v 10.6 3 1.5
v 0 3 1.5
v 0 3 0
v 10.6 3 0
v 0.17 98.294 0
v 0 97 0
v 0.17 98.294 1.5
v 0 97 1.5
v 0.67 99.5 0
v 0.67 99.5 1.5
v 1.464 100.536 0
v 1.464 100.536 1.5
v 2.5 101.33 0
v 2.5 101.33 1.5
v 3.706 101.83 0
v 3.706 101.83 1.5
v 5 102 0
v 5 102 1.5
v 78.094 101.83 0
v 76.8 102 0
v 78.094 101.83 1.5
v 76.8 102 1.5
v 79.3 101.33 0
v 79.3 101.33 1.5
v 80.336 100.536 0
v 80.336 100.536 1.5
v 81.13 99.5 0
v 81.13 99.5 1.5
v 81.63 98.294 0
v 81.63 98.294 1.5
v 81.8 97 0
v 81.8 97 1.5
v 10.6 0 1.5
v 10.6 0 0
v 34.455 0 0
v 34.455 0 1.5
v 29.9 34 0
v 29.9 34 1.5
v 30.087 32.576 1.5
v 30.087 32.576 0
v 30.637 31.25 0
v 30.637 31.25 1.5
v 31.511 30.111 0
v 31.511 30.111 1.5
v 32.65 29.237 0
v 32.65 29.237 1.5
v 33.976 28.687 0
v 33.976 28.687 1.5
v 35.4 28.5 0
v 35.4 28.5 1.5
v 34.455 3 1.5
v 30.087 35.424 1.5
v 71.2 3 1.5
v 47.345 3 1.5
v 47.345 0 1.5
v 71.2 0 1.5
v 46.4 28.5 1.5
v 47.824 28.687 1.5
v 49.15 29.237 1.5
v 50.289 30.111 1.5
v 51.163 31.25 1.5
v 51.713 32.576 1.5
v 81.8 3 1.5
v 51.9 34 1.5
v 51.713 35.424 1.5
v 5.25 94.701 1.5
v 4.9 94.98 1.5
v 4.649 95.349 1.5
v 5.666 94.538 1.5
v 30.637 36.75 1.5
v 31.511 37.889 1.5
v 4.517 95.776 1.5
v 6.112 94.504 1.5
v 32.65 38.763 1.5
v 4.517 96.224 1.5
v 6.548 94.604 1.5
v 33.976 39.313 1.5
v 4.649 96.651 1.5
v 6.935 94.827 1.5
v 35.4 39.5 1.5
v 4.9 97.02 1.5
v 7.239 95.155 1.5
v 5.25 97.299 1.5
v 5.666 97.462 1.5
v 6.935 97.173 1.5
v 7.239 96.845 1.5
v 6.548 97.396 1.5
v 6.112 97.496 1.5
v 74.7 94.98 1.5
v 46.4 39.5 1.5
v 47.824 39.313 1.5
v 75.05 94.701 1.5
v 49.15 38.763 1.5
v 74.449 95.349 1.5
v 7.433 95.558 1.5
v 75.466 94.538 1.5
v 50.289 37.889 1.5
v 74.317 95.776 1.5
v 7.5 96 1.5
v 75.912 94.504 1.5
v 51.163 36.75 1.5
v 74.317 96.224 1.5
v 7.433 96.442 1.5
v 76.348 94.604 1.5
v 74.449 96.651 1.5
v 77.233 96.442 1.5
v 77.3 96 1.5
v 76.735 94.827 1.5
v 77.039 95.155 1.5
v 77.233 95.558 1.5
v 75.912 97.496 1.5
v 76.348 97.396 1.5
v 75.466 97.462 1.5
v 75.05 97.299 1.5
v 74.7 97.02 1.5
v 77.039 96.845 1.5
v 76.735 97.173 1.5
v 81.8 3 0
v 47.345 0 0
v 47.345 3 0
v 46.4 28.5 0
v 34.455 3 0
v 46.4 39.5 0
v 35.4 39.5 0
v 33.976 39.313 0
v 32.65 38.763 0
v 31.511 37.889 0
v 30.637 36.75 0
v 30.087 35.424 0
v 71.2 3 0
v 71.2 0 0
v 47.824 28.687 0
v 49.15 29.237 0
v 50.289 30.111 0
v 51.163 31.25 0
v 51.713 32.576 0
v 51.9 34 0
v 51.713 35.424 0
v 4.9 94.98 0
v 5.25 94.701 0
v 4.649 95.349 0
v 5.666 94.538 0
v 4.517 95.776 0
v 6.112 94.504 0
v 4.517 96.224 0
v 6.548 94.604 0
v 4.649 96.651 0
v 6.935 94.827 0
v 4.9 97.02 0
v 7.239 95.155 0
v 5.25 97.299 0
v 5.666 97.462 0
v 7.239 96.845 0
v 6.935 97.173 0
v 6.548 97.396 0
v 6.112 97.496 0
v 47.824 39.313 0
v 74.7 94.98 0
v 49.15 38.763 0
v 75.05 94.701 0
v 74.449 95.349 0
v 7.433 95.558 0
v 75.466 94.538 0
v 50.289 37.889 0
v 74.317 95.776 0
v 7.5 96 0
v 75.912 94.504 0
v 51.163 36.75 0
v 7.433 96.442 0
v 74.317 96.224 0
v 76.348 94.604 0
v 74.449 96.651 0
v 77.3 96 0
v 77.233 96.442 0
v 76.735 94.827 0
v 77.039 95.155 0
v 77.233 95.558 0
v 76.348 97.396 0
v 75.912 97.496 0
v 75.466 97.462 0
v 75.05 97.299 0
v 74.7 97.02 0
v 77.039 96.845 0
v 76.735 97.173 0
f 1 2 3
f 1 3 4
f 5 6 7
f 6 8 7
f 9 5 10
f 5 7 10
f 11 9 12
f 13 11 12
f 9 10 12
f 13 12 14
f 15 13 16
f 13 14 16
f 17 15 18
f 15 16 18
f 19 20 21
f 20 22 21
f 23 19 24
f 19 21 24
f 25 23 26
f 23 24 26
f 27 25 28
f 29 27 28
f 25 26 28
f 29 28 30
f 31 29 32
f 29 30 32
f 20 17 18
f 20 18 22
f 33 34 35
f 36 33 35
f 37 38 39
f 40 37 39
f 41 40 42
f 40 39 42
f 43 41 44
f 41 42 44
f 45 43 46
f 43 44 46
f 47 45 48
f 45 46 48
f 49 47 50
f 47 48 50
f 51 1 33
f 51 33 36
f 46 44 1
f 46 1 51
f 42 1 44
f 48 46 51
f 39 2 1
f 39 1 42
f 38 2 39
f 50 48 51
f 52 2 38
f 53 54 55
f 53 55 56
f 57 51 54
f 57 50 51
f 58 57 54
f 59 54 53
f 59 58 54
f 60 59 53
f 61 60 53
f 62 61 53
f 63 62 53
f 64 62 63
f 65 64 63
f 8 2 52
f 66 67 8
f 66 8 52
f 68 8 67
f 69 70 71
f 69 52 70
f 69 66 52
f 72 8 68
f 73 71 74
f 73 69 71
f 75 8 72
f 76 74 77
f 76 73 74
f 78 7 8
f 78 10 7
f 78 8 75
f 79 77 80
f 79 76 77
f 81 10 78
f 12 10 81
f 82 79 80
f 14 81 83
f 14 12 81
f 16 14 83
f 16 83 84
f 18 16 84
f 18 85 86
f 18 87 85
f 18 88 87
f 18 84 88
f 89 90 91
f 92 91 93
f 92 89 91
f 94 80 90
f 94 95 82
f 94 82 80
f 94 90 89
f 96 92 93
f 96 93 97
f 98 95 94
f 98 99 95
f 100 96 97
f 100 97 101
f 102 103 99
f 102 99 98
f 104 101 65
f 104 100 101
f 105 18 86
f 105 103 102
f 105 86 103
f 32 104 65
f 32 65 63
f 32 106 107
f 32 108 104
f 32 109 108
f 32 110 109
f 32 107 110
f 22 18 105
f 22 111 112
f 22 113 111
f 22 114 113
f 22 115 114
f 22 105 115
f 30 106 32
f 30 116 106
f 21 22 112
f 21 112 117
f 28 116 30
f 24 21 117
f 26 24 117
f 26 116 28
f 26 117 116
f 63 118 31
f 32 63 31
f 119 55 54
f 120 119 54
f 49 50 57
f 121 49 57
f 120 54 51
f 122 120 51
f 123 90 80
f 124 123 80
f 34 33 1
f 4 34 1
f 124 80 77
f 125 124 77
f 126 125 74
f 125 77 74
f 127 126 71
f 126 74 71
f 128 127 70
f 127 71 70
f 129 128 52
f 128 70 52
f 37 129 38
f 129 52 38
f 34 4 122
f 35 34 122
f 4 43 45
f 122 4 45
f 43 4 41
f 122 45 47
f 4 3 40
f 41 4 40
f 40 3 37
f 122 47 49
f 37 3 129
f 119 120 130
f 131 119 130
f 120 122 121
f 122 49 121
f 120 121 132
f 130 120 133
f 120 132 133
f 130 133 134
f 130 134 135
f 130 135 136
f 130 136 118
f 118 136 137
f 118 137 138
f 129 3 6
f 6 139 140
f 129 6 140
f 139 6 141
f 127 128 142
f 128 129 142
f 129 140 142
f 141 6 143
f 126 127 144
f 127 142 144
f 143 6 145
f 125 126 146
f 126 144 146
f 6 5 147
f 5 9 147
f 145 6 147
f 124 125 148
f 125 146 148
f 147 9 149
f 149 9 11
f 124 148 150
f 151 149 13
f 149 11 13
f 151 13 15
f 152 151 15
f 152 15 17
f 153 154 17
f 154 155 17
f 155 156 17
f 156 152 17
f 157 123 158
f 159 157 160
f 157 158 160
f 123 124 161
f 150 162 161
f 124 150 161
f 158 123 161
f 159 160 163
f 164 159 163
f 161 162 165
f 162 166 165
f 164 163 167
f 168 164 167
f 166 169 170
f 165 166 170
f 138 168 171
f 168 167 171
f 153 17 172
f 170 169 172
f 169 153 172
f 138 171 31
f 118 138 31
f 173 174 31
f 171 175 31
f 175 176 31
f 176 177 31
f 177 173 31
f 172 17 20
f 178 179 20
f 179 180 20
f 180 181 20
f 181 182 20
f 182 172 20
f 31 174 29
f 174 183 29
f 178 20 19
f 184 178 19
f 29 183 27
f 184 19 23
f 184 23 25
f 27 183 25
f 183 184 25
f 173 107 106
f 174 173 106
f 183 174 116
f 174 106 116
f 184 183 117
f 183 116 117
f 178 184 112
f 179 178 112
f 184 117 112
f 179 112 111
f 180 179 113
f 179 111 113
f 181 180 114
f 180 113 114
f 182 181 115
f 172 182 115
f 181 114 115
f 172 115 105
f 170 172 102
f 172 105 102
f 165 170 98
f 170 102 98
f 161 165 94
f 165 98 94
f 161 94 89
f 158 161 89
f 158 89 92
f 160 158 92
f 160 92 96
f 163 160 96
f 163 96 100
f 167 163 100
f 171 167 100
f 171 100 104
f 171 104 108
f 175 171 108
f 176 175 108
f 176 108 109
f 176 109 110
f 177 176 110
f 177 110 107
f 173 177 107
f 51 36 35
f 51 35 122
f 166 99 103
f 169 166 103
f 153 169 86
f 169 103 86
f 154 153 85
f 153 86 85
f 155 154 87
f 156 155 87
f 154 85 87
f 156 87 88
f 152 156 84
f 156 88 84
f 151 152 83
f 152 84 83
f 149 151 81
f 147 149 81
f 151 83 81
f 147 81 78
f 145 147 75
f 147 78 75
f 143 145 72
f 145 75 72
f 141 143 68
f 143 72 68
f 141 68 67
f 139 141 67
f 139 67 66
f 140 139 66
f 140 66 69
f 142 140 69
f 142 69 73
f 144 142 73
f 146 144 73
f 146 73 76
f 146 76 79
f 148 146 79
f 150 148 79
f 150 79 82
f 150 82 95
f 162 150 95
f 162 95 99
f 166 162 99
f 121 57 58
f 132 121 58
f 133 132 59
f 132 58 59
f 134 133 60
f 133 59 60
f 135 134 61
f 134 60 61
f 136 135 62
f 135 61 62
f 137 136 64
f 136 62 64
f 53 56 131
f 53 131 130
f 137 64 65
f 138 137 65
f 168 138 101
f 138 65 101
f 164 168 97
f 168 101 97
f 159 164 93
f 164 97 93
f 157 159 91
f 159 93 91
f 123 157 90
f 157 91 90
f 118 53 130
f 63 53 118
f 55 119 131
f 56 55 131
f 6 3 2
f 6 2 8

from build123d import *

# Parameters (mm, degrees)
SKETCH1_W           = 81.8
SKETCH1_H           = 102
BOSS_EXTRUDE1_DEPTH = 1.5
SKETCH2_W           = 10.6
SKETCH2_H           = 3
SKETCH2_W_2         = 6.445
SKETCH2_R           = 1.5
CUT_EXTRUDE1_DEPTH  = 2.5
CUT_EXTRUDE2_DEPTH  = 2.5
FILLET1_R           = 5


with BuildPart() as part:
    # Sketch1 → Boss-Extrude1 (new body)
    with BuildSketch(Plane.XY):
        with Locations((40.9, 51)):
            Rectangle(SKETCH1_W, SKETCH1_H)
    extrude(amount=BOSS_EXTRUDE1_DEPTH)

    # Sketch2 → Cut-Extrude1 (cut, through all)
    with BuildSketch(Plane.XY.offset(1.5)):
        with Locations((5.3, 1.5)):
            Rectangle(SKETCH2_W, SKETCH2_H)
        with Locations((44.1225, 1.5)):
            Rectangle(SKETCH2_W_2, SKETCH2_H)
        with Locations((37.6775, 1.5)):
            Rectangle(SKETCH2_W_2, SKETCH2_H)
        with Locations((76.5, 1.5)):
            Rectangle(SKETCH2_W, SKETCH2_H)
        with Locations((6, 96)):
            Circle(SKETCH2_R)
        with Locations((75.8, 96)):
            Circle(SKETCH2_R)
    extrude(amount=-CUT_EXTRUDE1_DEPTH, mode=Mode.SUBTRACT)

    # Sketch3 → Cut-Extrude2 (cut, through all)
    with BuildSketch(Plane.XY.offset(1.5)):
        with BuildLine():
            ThreePointArc((35.4, 28.5), (39.289087297, 30.110912703), (40.9, 34))
            Line((40.9, 34), (29.9, 34))
            ThreePointArc((29.9, 34), (31.510912703, 30.110912703), (35.4, 28.5))
        make_face()
        with BuildLine():
            Line((29.9, 34), (40.9, 34))
            ThreePointArc((40.9, 34), (39.289087297, 37.889087297), (35.4, 39.5))
            ThreePointArc((35.4, 39.5), (31.510912703, 37.889087297), (29.9, 34))
        make_face()
        with BuildLine():
            ThreePointArc((46.4, 39.5), (42.510912703, 37.889087297), (40.9, 34))
            Line((40.9, 34), (51.9, 34))
            ThreePointArc((51.9, 34), (50.289087297, 37.889087297), (46.4, 39.5))
        make_face()
        with BuildLine():
            Line((51.9, 34), (40.9, 34))
            ThreePointArc((40.9, 34), (42.510912703, 30.110912703), (46.4, 28.5))
            ThreePointArc((46.4, 28.5), (50.289087297, 30.110912703), (51.9, 34))
        make_face()
        with BuildLine():
            Line((40.9, 28.5), (40.9, 34))
            ThreePointArc((40.9, 34), (39.289087297, 30.110912703), (35.4, 28.5))
            Line((35.4, 28.5), (40.9, 28.5))
        make_face()
        with BuildLine():
            ThreePointArc((46.4, 28.5), (42.510912703, 30.110912703), (40.9, 34))
            Line((40.9, 34), (40.9, 28.5))
            Line((40.9, 28.5), (46.4, 28.5))
        make_face()
        with BuildLine():
            Line((40.9, 39.5), (40.9, 34))
            ThreePointArc((40.9, 34), (42.510912703, 37.889087297), (46.4, 39.5))
            Line((46.4, 39.5), (40.9, 39.5))
        make_face()
        with BuildLine():
            ThreePointArc((35.4, 39.5), (39.289087297, 37.889087297), (40.9, 34))
            Line((40.9, 34), (40.9, 39.5))
            Line((40.9, 39.5), (35.4, 39.5))
        make_face()
    extrude(amount=-CUT_EXTRUDE2_DEPTH, mode=Mode.SUBTRACT)

    # Fillet1
    fillet1_edges = [part.edges().sort_by_distance(p)[0] for p in [
        (0, 102, 0.75),
        (81.8, 102, 0.75),
    ]]
    fillet(fillet1_edges, radius=FILLET1_R)


solid = part.part
